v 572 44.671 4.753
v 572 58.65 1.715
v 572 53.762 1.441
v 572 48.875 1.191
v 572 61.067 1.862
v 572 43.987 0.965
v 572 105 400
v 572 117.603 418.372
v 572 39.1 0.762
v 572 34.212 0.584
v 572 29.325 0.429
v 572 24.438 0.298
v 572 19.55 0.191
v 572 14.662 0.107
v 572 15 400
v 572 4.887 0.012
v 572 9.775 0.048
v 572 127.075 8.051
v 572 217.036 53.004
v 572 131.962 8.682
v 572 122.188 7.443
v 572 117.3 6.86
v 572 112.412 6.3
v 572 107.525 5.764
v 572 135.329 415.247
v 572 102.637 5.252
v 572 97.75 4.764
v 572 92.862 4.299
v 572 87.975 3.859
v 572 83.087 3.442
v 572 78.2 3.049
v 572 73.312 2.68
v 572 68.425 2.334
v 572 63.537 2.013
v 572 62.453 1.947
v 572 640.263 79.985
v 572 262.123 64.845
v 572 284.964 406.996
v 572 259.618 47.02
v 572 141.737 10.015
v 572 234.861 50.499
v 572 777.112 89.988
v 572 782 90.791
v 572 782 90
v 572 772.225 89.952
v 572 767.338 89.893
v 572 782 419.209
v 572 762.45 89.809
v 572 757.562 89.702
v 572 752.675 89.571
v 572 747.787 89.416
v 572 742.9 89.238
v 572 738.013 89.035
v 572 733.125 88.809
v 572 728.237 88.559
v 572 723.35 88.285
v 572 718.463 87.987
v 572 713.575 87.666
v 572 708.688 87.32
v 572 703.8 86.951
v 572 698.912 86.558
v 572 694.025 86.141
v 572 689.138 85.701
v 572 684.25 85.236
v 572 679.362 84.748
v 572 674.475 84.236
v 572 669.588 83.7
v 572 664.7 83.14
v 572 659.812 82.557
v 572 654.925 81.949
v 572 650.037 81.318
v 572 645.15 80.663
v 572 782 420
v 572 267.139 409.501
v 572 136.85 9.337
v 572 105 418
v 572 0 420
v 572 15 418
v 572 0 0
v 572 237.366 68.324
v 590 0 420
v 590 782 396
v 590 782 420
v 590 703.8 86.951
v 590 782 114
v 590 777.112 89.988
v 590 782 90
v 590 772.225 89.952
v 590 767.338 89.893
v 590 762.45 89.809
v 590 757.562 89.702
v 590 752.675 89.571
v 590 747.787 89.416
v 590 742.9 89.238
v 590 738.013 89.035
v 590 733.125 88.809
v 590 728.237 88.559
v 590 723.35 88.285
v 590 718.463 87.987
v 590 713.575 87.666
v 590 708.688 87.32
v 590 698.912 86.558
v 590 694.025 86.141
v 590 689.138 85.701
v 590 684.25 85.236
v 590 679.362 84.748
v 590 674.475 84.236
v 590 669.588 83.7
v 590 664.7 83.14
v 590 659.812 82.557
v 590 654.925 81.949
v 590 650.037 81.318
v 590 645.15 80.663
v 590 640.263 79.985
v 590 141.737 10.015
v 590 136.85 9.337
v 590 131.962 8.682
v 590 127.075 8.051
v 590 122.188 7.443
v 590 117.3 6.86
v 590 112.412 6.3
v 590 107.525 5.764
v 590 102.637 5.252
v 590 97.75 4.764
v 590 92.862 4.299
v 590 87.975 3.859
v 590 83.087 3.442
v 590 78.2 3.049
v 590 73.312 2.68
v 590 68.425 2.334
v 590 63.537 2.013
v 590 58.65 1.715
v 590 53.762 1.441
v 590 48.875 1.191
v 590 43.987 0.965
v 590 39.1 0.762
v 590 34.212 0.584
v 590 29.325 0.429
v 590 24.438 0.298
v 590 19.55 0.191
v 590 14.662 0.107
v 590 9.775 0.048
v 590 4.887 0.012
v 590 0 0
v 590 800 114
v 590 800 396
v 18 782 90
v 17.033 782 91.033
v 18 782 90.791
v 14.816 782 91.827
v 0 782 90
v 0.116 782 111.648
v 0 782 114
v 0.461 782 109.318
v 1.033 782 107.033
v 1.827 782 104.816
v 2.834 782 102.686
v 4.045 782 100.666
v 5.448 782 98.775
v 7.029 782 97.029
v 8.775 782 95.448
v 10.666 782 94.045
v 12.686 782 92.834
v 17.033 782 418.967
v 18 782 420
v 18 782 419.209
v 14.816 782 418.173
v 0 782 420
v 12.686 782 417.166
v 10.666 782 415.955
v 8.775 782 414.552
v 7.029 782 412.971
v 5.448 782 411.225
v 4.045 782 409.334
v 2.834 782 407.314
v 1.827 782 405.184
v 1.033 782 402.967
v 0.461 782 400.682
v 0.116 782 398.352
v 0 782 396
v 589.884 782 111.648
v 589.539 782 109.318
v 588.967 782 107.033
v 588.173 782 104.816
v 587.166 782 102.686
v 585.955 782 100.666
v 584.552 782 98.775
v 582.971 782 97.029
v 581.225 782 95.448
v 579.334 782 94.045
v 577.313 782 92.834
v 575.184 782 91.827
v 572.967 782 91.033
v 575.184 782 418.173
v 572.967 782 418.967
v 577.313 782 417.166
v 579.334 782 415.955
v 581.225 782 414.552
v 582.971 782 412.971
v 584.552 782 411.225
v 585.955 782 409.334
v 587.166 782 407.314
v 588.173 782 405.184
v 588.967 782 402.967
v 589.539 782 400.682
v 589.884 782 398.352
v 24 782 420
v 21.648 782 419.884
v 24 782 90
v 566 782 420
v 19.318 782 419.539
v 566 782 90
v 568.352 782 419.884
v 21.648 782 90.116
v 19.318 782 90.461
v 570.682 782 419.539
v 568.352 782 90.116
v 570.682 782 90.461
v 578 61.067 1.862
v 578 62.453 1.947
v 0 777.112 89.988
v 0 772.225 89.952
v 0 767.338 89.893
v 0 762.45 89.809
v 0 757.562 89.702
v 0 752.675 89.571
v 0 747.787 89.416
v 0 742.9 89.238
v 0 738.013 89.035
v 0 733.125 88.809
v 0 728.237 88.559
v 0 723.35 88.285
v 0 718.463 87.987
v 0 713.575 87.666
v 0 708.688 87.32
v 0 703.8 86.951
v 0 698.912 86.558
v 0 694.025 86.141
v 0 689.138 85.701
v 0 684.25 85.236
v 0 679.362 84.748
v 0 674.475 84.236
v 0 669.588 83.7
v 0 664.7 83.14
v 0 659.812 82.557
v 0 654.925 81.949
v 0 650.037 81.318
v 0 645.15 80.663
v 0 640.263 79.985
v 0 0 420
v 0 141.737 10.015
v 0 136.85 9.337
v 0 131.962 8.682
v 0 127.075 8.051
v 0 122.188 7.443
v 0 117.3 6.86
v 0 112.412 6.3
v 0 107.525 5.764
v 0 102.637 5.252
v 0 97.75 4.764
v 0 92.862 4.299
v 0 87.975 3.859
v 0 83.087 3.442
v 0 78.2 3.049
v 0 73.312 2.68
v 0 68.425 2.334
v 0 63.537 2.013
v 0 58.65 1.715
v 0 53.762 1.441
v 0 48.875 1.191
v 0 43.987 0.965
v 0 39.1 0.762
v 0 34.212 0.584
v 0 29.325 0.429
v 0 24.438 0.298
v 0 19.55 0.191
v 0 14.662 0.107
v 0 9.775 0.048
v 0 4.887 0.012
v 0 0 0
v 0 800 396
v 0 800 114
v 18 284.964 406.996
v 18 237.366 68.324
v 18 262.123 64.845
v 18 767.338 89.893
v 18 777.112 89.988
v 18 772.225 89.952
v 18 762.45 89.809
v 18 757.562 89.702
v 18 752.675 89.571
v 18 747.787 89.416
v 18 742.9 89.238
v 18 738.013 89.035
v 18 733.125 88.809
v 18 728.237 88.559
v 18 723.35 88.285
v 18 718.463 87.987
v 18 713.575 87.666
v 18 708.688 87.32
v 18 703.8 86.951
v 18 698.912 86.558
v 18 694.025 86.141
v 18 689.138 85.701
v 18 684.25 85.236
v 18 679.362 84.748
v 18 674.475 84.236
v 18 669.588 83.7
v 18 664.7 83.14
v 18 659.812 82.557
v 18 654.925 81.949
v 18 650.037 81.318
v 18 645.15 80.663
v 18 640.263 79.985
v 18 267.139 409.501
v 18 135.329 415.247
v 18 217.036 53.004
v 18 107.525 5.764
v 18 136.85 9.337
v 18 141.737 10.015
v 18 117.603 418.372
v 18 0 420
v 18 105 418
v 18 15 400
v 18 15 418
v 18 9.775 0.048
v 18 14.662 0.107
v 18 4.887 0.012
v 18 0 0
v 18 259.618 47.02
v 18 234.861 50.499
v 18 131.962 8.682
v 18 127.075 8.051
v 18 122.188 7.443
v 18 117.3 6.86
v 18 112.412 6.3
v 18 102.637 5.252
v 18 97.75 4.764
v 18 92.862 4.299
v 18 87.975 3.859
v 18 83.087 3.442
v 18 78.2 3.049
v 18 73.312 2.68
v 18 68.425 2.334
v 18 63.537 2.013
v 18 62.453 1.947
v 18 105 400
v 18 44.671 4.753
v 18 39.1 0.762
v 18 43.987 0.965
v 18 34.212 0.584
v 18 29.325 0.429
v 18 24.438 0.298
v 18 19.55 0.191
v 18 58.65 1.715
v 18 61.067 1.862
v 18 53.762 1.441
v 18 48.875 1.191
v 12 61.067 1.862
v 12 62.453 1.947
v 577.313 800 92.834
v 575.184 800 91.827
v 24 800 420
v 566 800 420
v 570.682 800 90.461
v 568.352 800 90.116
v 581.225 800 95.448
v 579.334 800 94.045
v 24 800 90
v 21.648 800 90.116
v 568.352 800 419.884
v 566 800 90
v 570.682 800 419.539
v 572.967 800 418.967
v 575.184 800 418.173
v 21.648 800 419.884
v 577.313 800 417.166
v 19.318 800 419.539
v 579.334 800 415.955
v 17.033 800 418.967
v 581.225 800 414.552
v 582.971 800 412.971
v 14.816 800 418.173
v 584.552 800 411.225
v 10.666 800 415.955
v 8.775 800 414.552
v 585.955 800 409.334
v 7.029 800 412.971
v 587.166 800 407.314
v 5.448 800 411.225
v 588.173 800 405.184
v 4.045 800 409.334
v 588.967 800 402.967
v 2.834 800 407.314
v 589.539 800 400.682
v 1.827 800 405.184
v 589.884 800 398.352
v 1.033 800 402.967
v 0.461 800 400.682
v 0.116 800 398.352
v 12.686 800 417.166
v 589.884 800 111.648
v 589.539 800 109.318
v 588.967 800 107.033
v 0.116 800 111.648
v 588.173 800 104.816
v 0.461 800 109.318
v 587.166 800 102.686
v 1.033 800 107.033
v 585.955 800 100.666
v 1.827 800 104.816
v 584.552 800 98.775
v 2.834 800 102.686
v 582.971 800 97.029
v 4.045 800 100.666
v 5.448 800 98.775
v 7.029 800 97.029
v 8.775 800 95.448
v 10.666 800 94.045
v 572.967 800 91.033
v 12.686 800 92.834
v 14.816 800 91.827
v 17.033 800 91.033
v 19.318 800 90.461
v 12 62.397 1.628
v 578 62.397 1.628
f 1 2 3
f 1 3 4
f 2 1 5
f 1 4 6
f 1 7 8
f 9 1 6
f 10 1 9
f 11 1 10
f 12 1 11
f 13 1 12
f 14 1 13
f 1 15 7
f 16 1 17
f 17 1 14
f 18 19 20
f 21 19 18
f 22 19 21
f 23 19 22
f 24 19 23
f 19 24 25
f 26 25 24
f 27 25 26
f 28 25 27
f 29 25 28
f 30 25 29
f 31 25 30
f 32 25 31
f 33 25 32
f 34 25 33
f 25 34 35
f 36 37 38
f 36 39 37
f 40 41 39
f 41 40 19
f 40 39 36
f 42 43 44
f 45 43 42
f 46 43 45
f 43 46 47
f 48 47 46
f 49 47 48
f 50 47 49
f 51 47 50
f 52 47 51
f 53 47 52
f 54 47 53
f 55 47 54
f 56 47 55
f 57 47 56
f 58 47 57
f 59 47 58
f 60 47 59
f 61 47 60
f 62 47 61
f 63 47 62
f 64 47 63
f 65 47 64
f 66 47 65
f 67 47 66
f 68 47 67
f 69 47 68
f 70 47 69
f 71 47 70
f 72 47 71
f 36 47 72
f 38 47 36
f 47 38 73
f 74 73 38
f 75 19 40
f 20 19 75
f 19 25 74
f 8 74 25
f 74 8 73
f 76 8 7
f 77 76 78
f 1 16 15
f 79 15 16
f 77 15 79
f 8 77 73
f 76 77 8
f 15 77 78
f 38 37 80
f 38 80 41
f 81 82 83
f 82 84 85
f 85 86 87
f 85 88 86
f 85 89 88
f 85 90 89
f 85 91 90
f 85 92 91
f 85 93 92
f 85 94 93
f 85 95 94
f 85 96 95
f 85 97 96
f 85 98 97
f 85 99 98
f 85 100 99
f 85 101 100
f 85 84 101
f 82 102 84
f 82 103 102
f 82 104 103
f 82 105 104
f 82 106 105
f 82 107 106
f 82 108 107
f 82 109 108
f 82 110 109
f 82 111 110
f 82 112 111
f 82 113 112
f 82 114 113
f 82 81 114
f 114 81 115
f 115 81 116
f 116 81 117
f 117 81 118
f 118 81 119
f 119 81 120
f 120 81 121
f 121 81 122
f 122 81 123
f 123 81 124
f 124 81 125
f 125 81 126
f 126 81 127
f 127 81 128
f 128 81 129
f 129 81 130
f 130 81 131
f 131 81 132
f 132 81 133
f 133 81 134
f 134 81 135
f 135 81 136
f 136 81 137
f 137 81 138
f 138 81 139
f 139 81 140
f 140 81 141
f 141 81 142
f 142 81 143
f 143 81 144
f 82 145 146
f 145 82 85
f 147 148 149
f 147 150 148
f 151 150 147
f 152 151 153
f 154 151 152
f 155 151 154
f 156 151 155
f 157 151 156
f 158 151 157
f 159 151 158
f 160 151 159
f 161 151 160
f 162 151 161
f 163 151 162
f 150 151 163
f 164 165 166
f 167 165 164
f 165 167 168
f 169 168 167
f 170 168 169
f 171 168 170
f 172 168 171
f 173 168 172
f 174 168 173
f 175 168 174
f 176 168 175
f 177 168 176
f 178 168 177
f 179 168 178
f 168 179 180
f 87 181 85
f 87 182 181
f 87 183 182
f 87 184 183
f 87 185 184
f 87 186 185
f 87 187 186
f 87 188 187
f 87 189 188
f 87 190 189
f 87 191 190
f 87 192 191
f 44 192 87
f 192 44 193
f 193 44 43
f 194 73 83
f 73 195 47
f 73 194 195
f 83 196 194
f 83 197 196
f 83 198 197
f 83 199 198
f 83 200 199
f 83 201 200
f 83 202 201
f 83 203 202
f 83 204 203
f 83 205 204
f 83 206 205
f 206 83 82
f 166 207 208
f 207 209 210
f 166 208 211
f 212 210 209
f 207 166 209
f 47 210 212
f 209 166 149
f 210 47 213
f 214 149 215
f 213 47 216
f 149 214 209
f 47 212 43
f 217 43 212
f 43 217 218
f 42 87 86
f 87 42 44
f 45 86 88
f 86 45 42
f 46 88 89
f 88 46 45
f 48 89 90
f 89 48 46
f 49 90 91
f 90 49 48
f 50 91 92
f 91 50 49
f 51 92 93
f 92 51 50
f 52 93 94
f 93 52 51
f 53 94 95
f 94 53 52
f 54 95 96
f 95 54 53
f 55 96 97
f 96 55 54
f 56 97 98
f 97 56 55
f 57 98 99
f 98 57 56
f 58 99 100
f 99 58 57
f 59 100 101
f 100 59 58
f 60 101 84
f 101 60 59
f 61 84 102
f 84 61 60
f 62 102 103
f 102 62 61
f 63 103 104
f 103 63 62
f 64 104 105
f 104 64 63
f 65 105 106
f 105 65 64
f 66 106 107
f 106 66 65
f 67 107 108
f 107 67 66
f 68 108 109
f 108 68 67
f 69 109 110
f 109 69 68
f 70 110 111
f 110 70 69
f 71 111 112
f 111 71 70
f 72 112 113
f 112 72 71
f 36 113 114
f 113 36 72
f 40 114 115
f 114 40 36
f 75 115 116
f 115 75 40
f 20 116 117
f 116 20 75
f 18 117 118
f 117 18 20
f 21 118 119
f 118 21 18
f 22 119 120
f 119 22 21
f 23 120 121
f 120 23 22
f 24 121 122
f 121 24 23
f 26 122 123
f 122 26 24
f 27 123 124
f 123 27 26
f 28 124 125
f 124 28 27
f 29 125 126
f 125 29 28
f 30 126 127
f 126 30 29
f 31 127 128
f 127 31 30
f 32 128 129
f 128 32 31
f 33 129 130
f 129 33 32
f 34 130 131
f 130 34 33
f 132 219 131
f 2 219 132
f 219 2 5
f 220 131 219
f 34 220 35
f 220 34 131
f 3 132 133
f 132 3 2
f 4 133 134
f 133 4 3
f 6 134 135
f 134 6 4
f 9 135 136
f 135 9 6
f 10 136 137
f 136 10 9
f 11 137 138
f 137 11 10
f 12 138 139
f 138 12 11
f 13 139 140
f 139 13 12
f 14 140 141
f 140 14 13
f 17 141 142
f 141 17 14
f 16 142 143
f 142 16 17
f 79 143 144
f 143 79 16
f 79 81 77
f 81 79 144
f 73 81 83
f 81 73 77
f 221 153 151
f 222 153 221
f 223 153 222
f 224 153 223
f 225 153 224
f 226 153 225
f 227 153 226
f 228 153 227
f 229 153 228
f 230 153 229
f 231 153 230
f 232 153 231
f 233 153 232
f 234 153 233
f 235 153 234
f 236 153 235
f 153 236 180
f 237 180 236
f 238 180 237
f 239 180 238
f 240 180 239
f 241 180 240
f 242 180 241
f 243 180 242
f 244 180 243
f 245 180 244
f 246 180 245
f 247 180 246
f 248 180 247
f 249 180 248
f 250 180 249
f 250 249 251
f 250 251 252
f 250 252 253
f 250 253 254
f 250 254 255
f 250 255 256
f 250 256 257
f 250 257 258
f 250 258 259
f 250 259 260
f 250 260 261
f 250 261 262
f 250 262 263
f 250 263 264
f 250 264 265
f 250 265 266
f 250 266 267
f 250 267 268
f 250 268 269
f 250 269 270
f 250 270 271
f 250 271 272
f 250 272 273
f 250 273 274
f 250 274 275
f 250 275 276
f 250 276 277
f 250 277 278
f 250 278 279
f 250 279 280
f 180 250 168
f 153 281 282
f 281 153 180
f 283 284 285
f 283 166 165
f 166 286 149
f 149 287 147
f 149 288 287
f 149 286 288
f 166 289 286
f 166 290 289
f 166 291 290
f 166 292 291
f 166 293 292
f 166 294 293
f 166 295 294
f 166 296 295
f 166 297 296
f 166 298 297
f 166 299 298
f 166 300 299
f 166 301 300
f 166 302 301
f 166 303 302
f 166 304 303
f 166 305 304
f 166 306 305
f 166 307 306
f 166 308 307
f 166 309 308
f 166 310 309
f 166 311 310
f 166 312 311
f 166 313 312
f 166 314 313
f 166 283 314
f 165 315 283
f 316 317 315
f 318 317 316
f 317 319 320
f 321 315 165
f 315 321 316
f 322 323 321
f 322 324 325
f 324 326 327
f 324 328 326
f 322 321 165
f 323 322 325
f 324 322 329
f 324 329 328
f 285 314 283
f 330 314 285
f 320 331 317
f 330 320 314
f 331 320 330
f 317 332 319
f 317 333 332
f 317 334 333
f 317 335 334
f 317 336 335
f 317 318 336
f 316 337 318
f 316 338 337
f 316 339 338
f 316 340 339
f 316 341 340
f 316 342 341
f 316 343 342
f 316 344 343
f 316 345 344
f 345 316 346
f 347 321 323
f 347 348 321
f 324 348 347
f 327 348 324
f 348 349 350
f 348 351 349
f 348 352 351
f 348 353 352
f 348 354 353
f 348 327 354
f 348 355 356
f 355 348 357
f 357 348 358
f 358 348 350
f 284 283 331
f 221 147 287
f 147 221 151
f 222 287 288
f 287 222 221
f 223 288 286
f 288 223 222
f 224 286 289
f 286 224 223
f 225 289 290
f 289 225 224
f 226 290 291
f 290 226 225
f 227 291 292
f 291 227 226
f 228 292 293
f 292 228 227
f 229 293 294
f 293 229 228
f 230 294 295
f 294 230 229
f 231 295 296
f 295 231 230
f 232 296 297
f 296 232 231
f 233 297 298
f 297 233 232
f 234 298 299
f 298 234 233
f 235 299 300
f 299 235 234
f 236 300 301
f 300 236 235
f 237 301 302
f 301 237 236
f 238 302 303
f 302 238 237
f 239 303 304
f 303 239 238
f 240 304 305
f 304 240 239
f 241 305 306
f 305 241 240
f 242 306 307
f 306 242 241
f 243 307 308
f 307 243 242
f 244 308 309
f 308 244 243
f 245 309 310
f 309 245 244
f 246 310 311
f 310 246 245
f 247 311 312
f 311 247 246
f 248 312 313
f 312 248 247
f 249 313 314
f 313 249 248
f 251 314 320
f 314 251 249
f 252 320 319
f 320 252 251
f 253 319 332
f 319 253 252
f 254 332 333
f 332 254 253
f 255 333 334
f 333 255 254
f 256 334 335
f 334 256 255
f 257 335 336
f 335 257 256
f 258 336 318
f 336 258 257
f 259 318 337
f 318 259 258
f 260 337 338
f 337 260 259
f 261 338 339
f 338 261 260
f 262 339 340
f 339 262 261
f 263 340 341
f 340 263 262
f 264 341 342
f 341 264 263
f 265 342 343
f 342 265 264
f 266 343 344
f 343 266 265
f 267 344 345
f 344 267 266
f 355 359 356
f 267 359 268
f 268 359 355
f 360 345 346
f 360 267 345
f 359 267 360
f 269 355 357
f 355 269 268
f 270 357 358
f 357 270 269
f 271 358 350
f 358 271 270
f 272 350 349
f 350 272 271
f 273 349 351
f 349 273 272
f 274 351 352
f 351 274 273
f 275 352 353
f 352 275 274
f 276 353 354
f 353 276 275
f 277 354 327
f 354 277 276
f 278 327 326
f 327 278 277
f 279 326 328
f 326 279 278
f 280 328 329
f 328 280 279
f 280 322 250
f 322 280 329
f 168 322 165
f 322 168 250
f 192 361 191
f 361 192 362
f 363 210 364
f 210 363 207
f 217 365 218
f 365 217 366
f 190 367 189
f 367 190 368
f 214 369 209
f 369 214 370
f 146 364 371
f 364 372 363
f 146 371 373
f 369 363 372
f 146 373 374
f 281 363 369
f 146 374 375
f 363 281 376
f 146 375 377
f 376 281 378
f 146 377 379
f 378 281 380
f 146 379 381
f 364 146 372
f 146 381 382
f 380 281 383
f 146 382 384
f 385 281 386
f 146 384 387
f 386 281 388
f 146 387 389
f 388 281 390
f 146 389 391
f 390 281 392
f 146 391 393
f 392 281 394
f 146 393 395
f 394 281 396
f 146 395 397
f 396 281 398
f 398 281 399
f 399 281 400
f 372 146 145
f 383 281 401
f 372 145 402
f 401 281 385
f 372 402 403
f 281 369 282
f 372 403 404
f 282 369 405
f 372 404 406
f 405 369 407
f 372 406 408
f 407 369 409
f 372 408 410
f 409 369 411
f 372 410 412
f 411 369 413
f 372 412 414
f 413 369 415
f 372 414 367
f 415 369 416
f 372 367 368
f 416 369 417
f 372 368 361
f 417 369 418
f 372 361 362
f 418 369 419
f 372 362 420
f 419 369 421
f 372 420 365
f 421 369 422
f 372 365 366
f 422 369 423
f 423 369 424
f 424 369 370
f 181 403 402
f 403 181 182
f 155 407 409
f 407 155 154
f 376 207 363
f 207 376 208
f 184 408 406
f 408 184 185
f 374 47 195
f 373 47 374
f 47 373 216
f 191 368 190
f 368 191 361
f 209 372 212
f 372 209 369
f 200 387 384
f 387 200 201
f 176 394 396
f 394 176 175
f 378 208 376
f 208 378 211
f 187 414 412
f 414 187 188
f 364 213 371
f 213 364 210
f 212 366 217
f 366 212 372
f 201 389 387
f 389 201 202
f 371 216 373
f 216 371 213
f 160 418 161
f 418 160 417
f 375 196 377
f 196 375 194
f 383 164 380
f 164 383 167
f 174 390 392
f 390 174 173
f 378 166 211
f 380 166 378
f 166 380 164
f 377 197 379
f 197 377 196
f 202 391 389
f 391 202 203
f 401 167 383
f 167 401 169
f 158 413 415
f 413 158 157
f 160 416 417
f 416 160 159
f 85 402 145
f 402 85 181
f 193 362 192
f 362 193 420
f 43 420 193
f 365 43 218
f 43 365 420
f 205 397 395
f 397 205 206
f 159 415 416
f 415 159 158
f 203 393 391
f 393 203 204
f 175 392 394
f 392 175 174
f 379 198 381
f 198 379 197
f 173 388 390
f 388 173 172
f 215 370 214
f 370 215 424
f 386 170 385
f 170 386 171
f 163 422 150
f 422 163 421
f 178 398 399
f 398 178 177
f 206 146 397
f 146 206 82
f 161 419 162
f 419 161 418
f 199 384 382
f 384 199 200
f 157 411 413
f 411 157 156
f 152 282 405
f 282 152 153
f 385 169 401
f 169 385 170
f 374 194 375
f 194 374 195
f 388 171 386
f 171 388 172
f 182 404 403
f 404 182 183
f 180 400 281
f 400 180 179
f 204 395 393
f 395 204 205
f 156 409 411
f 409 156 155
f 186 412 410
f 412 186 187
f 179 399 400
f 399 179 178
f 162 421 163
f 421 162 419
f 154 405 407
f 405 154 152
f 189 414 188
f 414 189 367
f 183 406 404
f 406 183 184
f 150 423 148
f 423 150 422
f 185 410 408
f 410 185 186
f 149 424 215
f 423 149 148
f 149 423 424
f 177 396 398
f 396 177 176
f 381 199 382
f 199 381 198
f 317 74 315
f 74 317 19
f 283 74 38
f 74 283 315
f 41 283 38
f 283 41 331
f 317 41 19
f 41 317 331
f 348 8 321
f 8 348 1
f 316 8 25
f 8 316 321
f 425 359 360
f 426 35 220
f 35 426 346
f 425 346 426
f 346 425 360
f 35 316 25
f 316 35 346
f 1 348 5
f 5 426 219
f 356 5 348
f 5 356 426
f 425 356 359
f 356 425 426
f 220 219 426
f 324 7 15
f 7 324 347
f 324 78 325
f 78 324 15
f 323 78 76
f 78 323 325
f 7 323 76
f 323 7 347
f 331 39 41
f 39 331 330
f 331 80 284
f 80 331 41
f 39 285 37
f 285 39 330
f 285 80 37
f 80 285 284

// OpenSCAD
// R5. Millimetres. Nominal assembly; dado machining not modelled.
multmatrix([[0, 0, 1, 572], [0, 1, 0, 0], [1, 0, 0, 0], [0, 0, 0, 1]]) linear_extrude(height=18) polygon([[0.0, 0.0], [0.011909, 4.8875], [0.047637, 9.775], [0.107184, 14.6625], [0.190549, 19.55], [0.297732, 24.4375], [0.428735, 29.325], [0.583556, 34.2125], [0.762195, 39.1], [0.964653, 43.9875], [1.19093, 48.875], [1.441025, 53.7625], [1.714939, 58.65], [2.012671, 63.5375], [2.334223, 68.425], [2.679592, 73.3125], [3.04878, 78.2], [3.441787, 83.0875], [3.858613, 87.975], [4.299257, 92.8625], [4.76372, 97.75], [5.252001, 102.6375], [5.764101, 107.525], [6.300019, 112.4125], [6.859756, 117.3], [7.443312, 122.1875], [8.050686, 127.075], [8.681879, 131.9625], [9.33689, 136.85], [10.015244, 141.7375], [10.70122, 146.625], [11.387195, 151.5125], [12.073171, 156.4], [12.759146, 161.2875], [13.445122, 166.175], [14.131098, 171.0625], [14.817073, 175.95], [15.503049, 180.8375], [16.189024, 185.725], [16.875, 190.6125], [17.560976, 195.5], [18.246951, 200.3875], [18.932927, 205.275], [19.618902, 210.1625], [20.304878, 215.05], [20.990854, 219.9375], [21.676829, 224.825], [22.362805, 229.7125], [23.04878, 234.6], [23.734756, 239.4875], [24.420732, 244.375], [25.106707, 249.2625], [25.792683, 254.15], [26.478659, 259.0375], [27.164634, 263.925], [27.85061, 268.8125], [28.536585, 273.7], [29.222561, 278.5875], [29.908537, 283.475], [30.594512, 288.3625], [31.280488, 293.25], [31.966463, 298.1375], [32.652439, 303.025], [33.338415, 307.9125], [34.02439, 312.8], [34.710366, 317.6875], [35.396341, 322.575], [36.082317, 327.4625], [36.768293, 332.35], [37.454268, 337.2375], [38.140244, 342.125], [38.82622, 347.0125], [39.512195, 351.9], [40.198171, 356.7875], [40.884146, 361.675], [41.570122, 366.5625], [42.256098, 371.45], [42.942073, 376.3375], [43.628049, 381.225], [44.314024, 386.1125], [45.0, 391.0], [45.685976, 395.8875], [46.371951, 400.775], [47.057927, 405.6625], [47.743902, 410.55], [48.429878, 415.4375], [49.115854, 420.325], [49.801829, 425.2125], [50.487805, 430.1], [51.17378, 434.9875], [51.859756, 439.875], [52.545732, 444.7625], [53.231707, 449.65], [53.917683, 454.5375], [54.603659, 459.425], [55.289634, 464.3125], [55.97561, 469.2], [56.661585, 474.0875], [57.347561, 478.975], [58.033537, 483.8625], [58.719512, 488.75], [59.405488, 493.6375], [60.091463, 498.525], [60.777439, 503.4125], [61.463415, 508.3], [62.14939, 513.1875], [62.835366, 518.075], [63.521341, 522.9625], [64.207317, 527.85], [64.893293, 532.7375], [65.579268, 537.625], [66.265244, 542.5125], [66.95122, 547.4], [67.637195, 552.2875], [68.323171, 557.175], [69.009146, 562.0625], [69.695122, 566.95], [70.381098, 571.8375], [71.067073, 576.725], [71.753049, 581.6125], [72.439024, 586.5], [73.125, 591.3875], [73.810976, 596.275], [74.496951, 601.1625], [75.182927, 606.05], [75.868902, 610.9375], [76.554878, 615.825], [77.240854, 620.7125], [77.926829, 625.6], [78.612805, 630.4875], [79.29878, 635.375], [79.984756, 640.2625], [80.66311, 645.15], [81.318121, 650.0375], [81.949314, 654.925], [82.556688, 659.8125], [83.140244, 664.7], [83.699981, 669.5875], [84.235899, 674.475], [84.747999, 679.3625], [85.23628, 684.25], [85.700743, 689.1375], [86.141387, 694.025], [86.558213, 698.9125], [86.95122, 703.8], [87.320408, 708.6875], [87.665777, 713.575], [87.987329, 718.4625], [88.285061, 723.35], [88.558975, 728.2375], [88.80907, 733.125], [89.035347, 738.0125], [89.237805, 742.9], [89.416444, 747.7875], [89.571265, 752.675], [89.702268, 757.5625], [89.809451, 762.45], [89.892816, 767.3375], [89.952363, 772.225], [89.988091, 777.1125], [90.0, 782.0], [420, 782], [420, 0]]);
multmatrix([[0, 0, 1, 0], [0, 1, 0, 0], [1, 0, 0, 0], [0, 0, 0, 1]]) linear_extrude(height=18) polygon([[0.0, 0.0], [0.011909, 4.8875], [0.047637, 9.775], [0.107184, 14.6625], [0.190549, 19.55], [0.297732, 24.4375], [0.428735, 29.325], [0.583556, 34.2125], [0.762195, 39.1], [0.964653, 43.9875], [1.19093, 48.875], [1.441025, 53.7625], [1.714939, 58.65], [2.012671, 63.5375], [2.334223, 68.425], [2.679592, 73.3125], [3.04878, 78.2], [3.441787, 83.0875], [3.858613, 87.975], [4.299257, 92.8625], [4.76372, 97.75], [5.252001, 102.6375], [5.764101, 107.525], [6.300019, 112.4125], [6.859756, 117.3], [7.443312, 122.1875], [8.050686, 127.075], [8.681879, 131.9625], [9.33689, 136.85], [10.015244, 141.7375], [10.70122, 146.625], [11.387195, 151.5125], [12.073171, 156.4], [12.759146, 161.2875], [13.445122, 166.175], [14.131098, 171.0625], [14.817073, 175.95], [15.503049, 180.8375], [16.189024, 185.725], [16.875, 190.6125], [17.560976, 195.5], [18.246951, 200.3875], [18.932927, 205.275], [19.618902, 210.1625], [20.304878, 215.05], [20.990854, 219.9375], [21.676829, 224.825], [22.362805, 229.7125], [23.04878, 234.6], [23.734756, 239.4875], [24.420732, 244.375], [25.106707, 249.2625], [25.792683, 254.15], [26.478659, 259.0375], [27.164634, 263.925], [27.85061, 268.8125], [28.536585, 273.7], [29.222561, 278.5875], [29.908537, 283.475], [30.594512, 288.3625], [31.280488, 293.25], [31.966463, 298.1375], [32.652439, 303.025], [33.338415, 307.9125], [34.02439, 312.8], [34.710366, 317.6875], [35.396341, 322.575], [36.082317, 327.4625], [36.768293, 332.35], [37.454268, 337.2375], [38.140244, 342.125], [38.82622, 347.0125], [39.512195, 351.9], [40.198171, 356.7875], [40.884146, 361.675], [41.570122, 366.5625], [42.256098, 371.45], [42.942073, 376.3375], [43.628049, 381.225], [44.314024, 386.1125], [45.0, 391.0], [45.685976, 395.8875], [46.371951, 400.775], [47.057927, 405.6625], [47.743902, 410.55], [48.429878, 415.4375], [49.115854, 420.325], [49.801829, 425.2125], [50.487805, 430.1], [51.17378, 434.9875], [51.859756, 439.875], [52.545732, 444.7625], [53.231707, 449.65], [53.917683, 454.5375], [54.603659, 459.425], [55.289634, 464.3125], [55.97561, 469.2], [56.661585, 474.0875], [57.347561, 478.975], [58.033537, 483.8625], [58.719512, 488.75], [59.405488, 493.6375], [60.091463, 498.525], [60.777439, 503.4125], [61.463415, 508.3], [62.14939, 513.1875], [62.835366, 518.075], [63.521341, 522.9625], [64.207317, 527.85], [64.893293, 532.7375], [65.579268, 537.625], [66.265244, 542.5125], [66.95122, 547.4], [67.637195, 552.2875], [68.323171, 557.175], [69.009146, 562.0625], [69.695122, 566.95], [70.381098, 571.8375], [71.067073, 576.725], [71.753049, 581.6125], [72.439024, 586.5], [73.125, 591.3875], [73.810976, 596.275], [74.496951, 601.1625], [75.182927, 606.05], [75.868902, 610.9375], [76.554878, 615.825], [77.240854, 620.7125], [77.926829, 625.6], [78.612805, 630.4875], [79.29878, 635.375], [79.984756, 640.2625], [80.66311, 645.15], [81.318121, 650.0375], [81.949314, 654.925], [82.556688, 659.8125], [83.140244, 664.7], [83.699981, 669.5875], [84.235899, 674.475], [84.747999, 679.3625], [85.23628, 684.25], [85.700743, 689.1375], [86.141387, 694.025], [86.558213, 698.9125], [86.95122, 703.8], [87.320408, 708.6875], [87.665777, 713.575], [87.987329, 718.4625], [88.285061, 723.35], [88.558975, 728.2375], [88.80907, 733.125], [89.035347, 738.0125], [89.237805, 742.9], [89.416444, 747.7875], [89.571265, 752.675], [89.702268, 757.5625], [89.809451, 762.45], [89.892816, 767.3375], [89.952363, 772.225], [89.988091, 777.1125], [90.0, 782.0], [420, 782], [420, 0]]);
multmatrix([[1, 0, 0, 0.0], [0, -0.0, 1.0, 782.0], [0, 1.0, 0.0, 90.0], [0, 0, 0, 1]]) linear_extrude(height=18) polygon([[0.0, 24.0], [0.115567, 21.647589], [0.461153, 19.317832], [1.033432, 17.033168], [1.826891, 14.815598], [2.83389, 12.686478], [4.044729, 10.666314], [5.447749, 8.774561], [7.029437, 7.029437], [8.774561, 5.447749], [10.666314, 4.044729], [12.686478, 2.83389], [14.815598, 1.826891], [17.033168, 1.033432], [19.317832, 0.461153], [21.647589, 0.115567], [24.0, 0.0], [566.0, 0.0], [568.352411, 0.115567], [570.682168, 0.461153], [572.966832, 1.033432], [575.184402, 1.826891], [577.313522, 2.83389], [579.333686, 4.044729], [581.225439, 5.447749], [582.970563, 7.029437], [584.552251, 8.774561], [585.955271, 10.666314], [587.16611, 12.686478], [588.173109, 14.815598], [588.966568, 17.033168], [589.538847, 19.317832], [589.884433, 21.647589], [590.0, 24.0], [590.0, 306.0], [589.884433, 308.352411], [589.538847, 310.682168], [588.966568, 312.966832], [588.173109, 315.184402], [587.16611, 317.313522], [585.955271, 319.333686], [584.552251, 321.225439], [582.970563, 322.970563], [581.225439, 324.552251], [579.333686, 325.955271], [577.313522, 327.16611], [575.184402, 328.173109], [572.966832, 328.966568], [570.682168, 329.538847], [568.352411, 329.884433], [566.0, 330.0], [24.0, 330.0], [21.647589, 329.884433], [19.317832, 329.538847], [17.033168, 328.966568], [14.815598, 328.173109], [12.686478, 327.16611], [10.666314, 325.955271], [8.774561, 324.552251], [7.029437, 322.970563], [5.447749, 321.225439], [4.044729, 319.333686], [2.83389, 317.313522], [1.826891, 315.184402], [1.033432, 312.966832], [0.461153, 310.682168], [0.115567, 308.352411], [0.0, 306.0]]);
multmatrix([[1, 0, 0, 12.0], [0, 0.13917310096006544, 0.9902680687415704, 217.0364292085141], [0, 0.9902680687415704, -0.13917310096006544, 53.00430553515792], [0, 0, 0, 1]]) linear_extrude(height=18) polygon([[0, 0], [566, 0], [566, 360], [0, 360]]);
multmatrix([[1, 0, 0, 12.0], [0, 0.17364817766693033, 0.984807753012208, 44.67061291283476], [0, 0.984807753012208, -0.17364817766693033, 4.7532054664386845], [0, 0, 0, 1]]) linear_extrude(height=18) polygon([[0, 0], [566, 0], [566, 420], [0, 420]]);
multmatrix([[1, 0, 0, 12.0], [0, 1.0, -0.0, 15.0], [0, 0.0, 1.0, 400.0], [0, 0, 0, 1]]) linear_extrude(height=18) polygon([[0, 0], [566, 0], [566, 90], [0, 90]]);
multmatrix([[1, 0, 0, 12.0], [0, 0.9902680687415704, 0.13917310096006544, 234.86125444586233], [0, -0.13917310096006544, 0.9902680687415704, 50.49918971787675], [0, 0, 0, 1]]) linear_extrude(height=18) polygon([[0, 0], [566, 0], [566, 25], [0, 25]]);
